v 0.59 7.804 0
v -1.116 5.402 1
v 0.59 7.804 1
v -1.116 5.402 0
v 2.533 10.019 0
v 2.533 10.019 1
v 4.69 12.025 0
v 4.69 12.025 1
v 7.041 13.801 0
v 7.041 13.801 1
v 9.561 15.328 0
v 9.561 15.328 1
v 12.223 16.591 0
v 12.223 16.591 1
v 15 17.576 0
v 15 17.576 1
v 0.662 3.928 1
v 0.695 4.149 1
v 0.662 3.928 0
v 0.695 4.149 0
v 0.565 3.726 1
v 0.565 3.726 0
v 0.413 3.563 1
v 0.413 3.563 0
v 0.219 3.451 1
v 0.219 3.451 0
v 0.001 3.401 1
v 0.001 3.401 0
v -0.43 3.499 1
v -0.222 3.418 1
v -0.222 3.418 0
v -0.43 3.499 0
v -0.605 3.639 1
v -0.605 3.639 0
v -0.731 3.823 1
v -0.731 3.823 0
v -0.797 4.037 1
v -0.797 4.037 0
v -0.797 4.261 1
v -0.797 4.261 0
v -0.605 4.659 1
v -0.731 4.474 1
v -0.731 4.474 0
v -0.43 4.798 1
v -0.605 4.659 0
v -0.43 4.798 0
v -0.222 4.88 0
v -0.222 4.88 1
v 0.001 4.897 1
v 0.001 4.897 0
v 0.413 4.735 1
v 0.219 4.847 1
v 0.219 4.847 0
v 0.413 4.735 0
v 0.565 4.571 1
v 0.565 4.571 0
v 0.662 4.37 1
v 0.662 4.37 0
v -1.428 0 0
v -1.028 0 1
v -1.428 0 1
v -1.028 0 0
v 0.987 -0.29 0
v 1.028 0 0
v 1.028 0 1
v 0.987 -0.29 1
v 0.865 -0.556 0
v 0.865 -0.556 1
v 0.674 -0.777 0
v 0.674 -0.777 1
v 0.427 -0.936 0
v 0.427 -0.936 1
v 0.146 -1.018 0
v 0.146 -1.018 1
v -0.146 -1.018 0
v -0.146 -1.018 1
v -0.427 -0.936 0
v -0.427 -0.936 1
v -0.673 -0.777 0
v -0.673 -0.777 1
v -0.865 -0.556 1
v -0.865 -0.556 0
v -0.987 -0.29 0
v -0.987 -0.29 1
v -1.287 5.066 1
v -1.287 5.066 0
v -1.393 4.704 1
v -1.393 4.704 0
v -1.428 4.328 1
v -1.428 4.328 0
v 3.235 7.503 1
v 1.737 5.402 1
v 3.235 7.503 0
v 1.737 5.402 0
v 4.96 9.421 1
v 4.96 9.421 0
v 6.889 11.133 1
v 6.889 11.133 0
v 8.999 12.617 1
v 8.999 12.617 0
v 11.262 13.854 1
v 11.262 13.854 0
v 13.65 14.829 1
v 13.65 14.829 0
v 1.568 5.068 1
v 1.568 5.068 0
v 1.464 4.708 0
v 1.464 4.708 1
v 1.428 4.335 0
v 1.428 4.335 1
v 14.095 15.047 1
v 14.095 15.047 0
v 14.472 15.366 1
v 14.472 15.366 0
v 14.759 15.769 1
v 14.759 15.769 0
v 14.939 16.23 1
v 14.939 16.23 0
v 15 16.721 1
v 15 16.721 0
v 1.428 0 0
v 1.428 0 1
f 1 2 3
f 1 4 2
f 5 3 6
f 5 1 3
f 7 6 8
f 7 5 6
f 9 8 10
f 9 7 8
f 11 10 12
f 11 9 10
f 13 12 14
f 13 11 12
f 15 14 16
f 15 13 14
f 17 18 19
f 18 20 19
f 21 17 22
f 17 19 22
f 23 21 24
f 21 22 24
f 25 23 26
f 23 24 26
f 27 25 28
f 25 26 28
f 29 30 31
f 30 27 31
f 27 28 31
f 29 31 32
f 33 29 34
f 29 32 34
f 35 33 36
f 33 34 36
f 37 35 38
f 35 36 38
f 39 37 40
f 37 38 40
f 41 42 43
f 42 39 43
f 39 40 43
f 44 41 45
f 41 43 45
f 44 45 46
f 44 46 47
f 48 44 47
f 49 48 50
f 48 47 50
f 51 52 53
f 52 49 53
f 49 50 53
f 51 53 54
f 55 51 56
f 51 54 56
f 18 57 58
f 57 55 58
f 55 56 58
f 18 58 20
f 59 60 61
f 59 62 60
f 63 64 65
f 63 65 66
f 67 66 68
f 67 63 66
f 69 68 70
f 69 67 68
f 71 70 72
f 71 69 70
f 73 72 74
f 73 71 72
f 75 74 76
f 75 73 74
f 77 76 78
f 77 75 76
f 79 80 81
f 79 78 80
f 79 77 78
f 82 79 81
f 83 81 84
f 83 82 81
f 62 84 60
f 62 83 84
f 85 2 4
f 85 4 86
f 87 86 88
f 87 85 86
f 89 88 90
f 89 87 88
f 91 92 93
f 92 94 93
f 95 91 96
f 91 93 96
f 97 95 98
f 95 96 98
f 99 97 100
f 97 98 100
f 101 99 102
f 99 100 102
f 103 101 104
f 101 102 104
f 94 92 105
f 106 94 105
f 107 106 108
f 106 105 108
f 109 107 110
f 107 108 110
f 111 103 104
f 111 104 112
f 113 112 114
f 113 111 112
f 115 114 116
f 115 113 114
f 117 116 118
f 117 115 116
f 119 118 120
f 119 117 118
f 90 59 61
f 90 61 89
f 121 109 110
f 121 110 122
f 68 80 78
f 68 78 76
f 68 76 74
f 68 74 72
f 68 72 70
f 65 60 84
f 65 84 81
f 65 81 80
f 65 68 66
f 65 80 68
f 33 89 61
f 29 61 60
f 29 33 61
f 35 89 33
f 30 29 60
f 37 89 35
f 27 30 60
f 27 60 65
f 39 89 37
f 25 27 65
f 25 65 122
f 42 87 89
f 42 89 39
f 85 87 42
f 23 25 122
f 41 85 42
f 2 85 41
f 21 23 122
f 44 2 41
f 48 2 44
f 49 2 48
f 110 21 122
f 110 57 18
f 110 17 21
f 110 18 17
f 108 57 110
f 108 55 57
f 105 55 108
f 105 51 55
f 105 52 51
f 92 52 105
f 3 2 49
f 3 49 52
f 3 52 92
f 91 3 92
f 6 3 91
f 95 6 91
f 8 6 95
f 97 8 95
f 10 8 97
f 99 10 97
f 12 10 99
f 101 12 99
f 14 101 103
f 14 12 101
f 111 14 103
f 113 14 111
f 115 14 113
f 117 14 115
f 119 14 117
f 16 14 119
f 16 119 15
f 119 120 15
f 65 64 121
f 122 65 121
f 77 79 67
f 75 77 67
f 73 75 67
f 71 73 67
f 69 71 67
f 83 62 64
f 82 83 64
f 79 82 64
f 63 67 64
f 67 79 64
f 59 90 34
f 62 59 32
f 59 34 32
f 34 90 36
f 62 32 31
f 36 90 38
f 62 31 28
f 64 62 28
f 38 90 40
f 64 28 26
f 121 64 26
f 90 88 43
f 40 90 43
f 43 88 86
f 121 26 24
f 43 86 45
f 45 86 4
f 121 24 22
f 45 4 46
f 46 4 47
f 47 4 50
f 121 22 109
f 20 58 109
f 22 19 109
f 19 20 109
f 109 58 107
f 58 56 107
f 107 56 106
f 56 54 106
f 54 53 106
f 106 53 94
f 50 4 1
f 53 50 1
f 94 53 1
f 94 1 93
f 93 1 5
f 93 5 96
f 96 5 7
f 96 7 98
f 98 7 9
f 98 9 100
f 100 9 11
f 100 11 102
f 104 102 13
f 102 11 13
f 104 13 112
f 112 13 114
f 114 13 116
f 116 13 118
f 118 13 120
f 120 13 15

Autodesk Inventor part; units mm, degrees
ref_plane "YZ Plane" through (0, 0, 0) normal (1, 0, 0) x (0, 1, 0)
ref_plane "XZ Plane" through (0, 0, 0) normal (0, 1, 0) x (-1, 0, 0)
ref_plane "XY Plane" through (0, 0, 0) normal (0, 0, 1) x (1, 0, 0)
sketch "Sketch1" plane through (0, 0, 0) normal (0, 0, 1) x (1, 0, 0)
  circle A0 centre (-0.0549, 4.1489) radius 0.75
  line L0 (-1.4285, -0.0001) -> (-1.4285, 4.899)
  line L1 (-1.4285, 4.899) -> (1.4285, 4.899) construction
  line L2 (1.4285, 4.899) -> (1.4285, 0)
  circle A1 centre (0, 0) radius 1.0285
  line L3 (-1.0285, -0.0001) -> (-1.4285, -0.0001)
  line L4 (1.0285, 0) -> (1.4285, 0)
  line L5 (0, 0) -> (15, 0)
  arc A2 (15, 17.5757) -> (-1.4285, 4.899) centre (23.253, -10.1036) ccw
  arc A3 (15, 15.2472) -> (1.4285, 4.899) centre (21.0936, -6.818) ccw
  line L6 (15, 15.2472) -> (15, 17.5757)
  point P0 (0.0155, 4.8988)
  dimension "d6" = 1.5
  dimension "d28" = 2.057
  dimension "d29" = 0.4
  dimension "d30" = 0.4
  dimension "d33" = 15
extrude "Extrusion1" add sketch "Sketch1" along normal blind 1 contours L0 A2 L6 A3 L2 L4 A1 L3
extrude "Extrusion2" add sketch "Sketch1" along normal blind 1 contours A1
fillet "Fillet5" radius 2 3 edges at (15, 15.2472, 0.5) (-1.4285, 4.899, 0.5) (1.4285, 4.899, 0.5)
properties material "Nickel-Copper Alloy 400"
